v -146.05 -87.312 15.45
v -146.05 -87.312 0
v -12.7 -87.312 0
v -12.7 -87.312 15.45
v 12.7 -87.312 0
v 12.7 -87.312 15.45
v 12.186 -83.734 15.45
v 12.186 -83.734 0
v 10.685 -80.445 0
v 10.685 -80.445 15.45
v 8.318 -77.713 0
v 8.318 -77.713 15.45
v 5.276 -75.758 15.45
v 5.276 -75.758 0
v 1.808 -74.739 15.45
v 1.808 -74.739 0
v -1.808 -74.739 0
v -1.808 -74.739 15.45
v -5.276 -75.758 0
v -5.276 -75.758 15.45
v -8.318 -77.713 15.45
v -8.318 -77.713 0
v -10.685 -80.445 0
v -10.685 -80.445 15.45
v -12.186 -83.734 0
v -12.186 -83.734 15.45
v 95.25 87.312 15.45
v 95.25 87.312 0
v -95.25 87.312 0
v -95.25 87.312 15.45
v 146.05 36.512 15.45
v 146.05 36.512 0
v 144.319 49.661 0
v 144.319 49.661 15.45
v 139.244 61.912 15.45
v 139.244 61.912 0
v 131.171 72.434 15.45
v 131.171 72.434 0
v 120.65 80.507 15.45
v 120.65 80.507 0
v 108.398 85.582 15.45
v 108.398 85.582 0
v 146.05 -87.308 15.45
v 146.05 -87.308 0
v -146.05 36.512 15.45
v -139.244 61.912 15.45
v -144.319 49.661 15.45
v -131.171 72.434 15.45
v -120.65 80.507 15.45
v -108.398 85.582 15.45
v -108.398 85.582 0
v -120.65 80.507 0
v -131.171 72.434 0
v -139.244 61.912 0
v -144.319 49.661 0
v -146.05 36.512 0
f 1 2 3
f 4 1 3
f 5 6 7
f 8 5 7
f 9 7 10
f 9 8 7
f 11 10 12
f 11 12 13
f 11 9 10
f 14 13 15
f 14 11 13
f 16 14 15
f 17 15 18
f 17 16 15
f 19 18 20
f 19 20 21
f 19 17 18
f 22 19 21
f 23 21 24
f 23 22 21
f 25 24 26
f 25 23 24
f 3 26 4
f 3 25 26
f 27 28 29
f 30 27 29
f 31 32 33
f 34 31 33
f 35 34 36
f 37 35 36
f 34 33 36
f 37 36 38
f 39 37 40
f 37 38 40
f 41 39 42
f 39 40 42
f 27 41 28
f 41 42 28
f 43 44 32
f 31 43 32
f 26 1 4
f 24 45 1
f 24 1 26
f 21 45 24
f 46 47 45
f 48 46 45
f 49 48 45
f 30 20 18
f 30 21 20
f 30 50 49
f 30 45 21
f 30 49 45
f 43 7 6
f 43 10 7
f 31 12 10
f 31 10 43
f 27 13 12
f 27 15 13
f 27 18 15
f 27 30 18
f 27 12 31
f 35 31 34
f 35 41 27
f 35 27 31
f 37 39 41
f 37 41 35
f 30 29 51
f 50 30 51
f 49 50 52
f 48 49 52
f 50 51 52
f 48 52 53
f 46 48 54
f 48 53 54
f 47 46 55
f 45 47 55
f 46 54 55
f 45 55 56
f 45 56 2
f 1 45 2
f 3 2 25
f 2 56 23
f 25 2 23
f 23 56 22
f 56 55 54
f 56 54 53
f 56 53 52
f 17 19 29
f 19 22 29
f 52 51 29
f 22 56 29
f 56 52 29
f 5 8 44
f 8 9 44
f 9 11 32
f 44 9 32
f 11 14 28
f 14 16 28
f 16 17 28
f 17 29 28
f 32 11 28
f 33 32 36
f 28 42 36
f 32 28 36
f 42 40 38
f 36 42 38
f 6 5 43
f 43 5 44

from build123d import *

# Parameters (mm, degrees)
PAD_DEPTH = 15.45


with BuildPart() as part:
    # Sketch → Pad (new body)
    with BuildSketch(Plane.XY):
        with BuildLine():
            Line((-146.05, 36.5125), (-146.05, -87.3125))
            Line((-146.05, -87.3125), (-12.7, -87.3125))
            ThreePointArc((12.7, -87.3125), (0, -74.61), (-12.7, -87.3125))
            Line((12.7, -87.3125), (146.05, -87.3075))
            Line((146.05, -87.3075), (146.05, 36.5125))
            ThreePointArc((146.05, 36.5125), (131.171024, 72.433524), (95.25, 87.3125))
            Line((95.25, 87.3125), (-95.25, 87.3125))
            ThreePointArc((-95.25, 87.3125), (-131.171024, 72.433524), (-146.05, 36.5125))
        make_face()
    extrude(amount=PAD_DEPTH)


solid = part.part
